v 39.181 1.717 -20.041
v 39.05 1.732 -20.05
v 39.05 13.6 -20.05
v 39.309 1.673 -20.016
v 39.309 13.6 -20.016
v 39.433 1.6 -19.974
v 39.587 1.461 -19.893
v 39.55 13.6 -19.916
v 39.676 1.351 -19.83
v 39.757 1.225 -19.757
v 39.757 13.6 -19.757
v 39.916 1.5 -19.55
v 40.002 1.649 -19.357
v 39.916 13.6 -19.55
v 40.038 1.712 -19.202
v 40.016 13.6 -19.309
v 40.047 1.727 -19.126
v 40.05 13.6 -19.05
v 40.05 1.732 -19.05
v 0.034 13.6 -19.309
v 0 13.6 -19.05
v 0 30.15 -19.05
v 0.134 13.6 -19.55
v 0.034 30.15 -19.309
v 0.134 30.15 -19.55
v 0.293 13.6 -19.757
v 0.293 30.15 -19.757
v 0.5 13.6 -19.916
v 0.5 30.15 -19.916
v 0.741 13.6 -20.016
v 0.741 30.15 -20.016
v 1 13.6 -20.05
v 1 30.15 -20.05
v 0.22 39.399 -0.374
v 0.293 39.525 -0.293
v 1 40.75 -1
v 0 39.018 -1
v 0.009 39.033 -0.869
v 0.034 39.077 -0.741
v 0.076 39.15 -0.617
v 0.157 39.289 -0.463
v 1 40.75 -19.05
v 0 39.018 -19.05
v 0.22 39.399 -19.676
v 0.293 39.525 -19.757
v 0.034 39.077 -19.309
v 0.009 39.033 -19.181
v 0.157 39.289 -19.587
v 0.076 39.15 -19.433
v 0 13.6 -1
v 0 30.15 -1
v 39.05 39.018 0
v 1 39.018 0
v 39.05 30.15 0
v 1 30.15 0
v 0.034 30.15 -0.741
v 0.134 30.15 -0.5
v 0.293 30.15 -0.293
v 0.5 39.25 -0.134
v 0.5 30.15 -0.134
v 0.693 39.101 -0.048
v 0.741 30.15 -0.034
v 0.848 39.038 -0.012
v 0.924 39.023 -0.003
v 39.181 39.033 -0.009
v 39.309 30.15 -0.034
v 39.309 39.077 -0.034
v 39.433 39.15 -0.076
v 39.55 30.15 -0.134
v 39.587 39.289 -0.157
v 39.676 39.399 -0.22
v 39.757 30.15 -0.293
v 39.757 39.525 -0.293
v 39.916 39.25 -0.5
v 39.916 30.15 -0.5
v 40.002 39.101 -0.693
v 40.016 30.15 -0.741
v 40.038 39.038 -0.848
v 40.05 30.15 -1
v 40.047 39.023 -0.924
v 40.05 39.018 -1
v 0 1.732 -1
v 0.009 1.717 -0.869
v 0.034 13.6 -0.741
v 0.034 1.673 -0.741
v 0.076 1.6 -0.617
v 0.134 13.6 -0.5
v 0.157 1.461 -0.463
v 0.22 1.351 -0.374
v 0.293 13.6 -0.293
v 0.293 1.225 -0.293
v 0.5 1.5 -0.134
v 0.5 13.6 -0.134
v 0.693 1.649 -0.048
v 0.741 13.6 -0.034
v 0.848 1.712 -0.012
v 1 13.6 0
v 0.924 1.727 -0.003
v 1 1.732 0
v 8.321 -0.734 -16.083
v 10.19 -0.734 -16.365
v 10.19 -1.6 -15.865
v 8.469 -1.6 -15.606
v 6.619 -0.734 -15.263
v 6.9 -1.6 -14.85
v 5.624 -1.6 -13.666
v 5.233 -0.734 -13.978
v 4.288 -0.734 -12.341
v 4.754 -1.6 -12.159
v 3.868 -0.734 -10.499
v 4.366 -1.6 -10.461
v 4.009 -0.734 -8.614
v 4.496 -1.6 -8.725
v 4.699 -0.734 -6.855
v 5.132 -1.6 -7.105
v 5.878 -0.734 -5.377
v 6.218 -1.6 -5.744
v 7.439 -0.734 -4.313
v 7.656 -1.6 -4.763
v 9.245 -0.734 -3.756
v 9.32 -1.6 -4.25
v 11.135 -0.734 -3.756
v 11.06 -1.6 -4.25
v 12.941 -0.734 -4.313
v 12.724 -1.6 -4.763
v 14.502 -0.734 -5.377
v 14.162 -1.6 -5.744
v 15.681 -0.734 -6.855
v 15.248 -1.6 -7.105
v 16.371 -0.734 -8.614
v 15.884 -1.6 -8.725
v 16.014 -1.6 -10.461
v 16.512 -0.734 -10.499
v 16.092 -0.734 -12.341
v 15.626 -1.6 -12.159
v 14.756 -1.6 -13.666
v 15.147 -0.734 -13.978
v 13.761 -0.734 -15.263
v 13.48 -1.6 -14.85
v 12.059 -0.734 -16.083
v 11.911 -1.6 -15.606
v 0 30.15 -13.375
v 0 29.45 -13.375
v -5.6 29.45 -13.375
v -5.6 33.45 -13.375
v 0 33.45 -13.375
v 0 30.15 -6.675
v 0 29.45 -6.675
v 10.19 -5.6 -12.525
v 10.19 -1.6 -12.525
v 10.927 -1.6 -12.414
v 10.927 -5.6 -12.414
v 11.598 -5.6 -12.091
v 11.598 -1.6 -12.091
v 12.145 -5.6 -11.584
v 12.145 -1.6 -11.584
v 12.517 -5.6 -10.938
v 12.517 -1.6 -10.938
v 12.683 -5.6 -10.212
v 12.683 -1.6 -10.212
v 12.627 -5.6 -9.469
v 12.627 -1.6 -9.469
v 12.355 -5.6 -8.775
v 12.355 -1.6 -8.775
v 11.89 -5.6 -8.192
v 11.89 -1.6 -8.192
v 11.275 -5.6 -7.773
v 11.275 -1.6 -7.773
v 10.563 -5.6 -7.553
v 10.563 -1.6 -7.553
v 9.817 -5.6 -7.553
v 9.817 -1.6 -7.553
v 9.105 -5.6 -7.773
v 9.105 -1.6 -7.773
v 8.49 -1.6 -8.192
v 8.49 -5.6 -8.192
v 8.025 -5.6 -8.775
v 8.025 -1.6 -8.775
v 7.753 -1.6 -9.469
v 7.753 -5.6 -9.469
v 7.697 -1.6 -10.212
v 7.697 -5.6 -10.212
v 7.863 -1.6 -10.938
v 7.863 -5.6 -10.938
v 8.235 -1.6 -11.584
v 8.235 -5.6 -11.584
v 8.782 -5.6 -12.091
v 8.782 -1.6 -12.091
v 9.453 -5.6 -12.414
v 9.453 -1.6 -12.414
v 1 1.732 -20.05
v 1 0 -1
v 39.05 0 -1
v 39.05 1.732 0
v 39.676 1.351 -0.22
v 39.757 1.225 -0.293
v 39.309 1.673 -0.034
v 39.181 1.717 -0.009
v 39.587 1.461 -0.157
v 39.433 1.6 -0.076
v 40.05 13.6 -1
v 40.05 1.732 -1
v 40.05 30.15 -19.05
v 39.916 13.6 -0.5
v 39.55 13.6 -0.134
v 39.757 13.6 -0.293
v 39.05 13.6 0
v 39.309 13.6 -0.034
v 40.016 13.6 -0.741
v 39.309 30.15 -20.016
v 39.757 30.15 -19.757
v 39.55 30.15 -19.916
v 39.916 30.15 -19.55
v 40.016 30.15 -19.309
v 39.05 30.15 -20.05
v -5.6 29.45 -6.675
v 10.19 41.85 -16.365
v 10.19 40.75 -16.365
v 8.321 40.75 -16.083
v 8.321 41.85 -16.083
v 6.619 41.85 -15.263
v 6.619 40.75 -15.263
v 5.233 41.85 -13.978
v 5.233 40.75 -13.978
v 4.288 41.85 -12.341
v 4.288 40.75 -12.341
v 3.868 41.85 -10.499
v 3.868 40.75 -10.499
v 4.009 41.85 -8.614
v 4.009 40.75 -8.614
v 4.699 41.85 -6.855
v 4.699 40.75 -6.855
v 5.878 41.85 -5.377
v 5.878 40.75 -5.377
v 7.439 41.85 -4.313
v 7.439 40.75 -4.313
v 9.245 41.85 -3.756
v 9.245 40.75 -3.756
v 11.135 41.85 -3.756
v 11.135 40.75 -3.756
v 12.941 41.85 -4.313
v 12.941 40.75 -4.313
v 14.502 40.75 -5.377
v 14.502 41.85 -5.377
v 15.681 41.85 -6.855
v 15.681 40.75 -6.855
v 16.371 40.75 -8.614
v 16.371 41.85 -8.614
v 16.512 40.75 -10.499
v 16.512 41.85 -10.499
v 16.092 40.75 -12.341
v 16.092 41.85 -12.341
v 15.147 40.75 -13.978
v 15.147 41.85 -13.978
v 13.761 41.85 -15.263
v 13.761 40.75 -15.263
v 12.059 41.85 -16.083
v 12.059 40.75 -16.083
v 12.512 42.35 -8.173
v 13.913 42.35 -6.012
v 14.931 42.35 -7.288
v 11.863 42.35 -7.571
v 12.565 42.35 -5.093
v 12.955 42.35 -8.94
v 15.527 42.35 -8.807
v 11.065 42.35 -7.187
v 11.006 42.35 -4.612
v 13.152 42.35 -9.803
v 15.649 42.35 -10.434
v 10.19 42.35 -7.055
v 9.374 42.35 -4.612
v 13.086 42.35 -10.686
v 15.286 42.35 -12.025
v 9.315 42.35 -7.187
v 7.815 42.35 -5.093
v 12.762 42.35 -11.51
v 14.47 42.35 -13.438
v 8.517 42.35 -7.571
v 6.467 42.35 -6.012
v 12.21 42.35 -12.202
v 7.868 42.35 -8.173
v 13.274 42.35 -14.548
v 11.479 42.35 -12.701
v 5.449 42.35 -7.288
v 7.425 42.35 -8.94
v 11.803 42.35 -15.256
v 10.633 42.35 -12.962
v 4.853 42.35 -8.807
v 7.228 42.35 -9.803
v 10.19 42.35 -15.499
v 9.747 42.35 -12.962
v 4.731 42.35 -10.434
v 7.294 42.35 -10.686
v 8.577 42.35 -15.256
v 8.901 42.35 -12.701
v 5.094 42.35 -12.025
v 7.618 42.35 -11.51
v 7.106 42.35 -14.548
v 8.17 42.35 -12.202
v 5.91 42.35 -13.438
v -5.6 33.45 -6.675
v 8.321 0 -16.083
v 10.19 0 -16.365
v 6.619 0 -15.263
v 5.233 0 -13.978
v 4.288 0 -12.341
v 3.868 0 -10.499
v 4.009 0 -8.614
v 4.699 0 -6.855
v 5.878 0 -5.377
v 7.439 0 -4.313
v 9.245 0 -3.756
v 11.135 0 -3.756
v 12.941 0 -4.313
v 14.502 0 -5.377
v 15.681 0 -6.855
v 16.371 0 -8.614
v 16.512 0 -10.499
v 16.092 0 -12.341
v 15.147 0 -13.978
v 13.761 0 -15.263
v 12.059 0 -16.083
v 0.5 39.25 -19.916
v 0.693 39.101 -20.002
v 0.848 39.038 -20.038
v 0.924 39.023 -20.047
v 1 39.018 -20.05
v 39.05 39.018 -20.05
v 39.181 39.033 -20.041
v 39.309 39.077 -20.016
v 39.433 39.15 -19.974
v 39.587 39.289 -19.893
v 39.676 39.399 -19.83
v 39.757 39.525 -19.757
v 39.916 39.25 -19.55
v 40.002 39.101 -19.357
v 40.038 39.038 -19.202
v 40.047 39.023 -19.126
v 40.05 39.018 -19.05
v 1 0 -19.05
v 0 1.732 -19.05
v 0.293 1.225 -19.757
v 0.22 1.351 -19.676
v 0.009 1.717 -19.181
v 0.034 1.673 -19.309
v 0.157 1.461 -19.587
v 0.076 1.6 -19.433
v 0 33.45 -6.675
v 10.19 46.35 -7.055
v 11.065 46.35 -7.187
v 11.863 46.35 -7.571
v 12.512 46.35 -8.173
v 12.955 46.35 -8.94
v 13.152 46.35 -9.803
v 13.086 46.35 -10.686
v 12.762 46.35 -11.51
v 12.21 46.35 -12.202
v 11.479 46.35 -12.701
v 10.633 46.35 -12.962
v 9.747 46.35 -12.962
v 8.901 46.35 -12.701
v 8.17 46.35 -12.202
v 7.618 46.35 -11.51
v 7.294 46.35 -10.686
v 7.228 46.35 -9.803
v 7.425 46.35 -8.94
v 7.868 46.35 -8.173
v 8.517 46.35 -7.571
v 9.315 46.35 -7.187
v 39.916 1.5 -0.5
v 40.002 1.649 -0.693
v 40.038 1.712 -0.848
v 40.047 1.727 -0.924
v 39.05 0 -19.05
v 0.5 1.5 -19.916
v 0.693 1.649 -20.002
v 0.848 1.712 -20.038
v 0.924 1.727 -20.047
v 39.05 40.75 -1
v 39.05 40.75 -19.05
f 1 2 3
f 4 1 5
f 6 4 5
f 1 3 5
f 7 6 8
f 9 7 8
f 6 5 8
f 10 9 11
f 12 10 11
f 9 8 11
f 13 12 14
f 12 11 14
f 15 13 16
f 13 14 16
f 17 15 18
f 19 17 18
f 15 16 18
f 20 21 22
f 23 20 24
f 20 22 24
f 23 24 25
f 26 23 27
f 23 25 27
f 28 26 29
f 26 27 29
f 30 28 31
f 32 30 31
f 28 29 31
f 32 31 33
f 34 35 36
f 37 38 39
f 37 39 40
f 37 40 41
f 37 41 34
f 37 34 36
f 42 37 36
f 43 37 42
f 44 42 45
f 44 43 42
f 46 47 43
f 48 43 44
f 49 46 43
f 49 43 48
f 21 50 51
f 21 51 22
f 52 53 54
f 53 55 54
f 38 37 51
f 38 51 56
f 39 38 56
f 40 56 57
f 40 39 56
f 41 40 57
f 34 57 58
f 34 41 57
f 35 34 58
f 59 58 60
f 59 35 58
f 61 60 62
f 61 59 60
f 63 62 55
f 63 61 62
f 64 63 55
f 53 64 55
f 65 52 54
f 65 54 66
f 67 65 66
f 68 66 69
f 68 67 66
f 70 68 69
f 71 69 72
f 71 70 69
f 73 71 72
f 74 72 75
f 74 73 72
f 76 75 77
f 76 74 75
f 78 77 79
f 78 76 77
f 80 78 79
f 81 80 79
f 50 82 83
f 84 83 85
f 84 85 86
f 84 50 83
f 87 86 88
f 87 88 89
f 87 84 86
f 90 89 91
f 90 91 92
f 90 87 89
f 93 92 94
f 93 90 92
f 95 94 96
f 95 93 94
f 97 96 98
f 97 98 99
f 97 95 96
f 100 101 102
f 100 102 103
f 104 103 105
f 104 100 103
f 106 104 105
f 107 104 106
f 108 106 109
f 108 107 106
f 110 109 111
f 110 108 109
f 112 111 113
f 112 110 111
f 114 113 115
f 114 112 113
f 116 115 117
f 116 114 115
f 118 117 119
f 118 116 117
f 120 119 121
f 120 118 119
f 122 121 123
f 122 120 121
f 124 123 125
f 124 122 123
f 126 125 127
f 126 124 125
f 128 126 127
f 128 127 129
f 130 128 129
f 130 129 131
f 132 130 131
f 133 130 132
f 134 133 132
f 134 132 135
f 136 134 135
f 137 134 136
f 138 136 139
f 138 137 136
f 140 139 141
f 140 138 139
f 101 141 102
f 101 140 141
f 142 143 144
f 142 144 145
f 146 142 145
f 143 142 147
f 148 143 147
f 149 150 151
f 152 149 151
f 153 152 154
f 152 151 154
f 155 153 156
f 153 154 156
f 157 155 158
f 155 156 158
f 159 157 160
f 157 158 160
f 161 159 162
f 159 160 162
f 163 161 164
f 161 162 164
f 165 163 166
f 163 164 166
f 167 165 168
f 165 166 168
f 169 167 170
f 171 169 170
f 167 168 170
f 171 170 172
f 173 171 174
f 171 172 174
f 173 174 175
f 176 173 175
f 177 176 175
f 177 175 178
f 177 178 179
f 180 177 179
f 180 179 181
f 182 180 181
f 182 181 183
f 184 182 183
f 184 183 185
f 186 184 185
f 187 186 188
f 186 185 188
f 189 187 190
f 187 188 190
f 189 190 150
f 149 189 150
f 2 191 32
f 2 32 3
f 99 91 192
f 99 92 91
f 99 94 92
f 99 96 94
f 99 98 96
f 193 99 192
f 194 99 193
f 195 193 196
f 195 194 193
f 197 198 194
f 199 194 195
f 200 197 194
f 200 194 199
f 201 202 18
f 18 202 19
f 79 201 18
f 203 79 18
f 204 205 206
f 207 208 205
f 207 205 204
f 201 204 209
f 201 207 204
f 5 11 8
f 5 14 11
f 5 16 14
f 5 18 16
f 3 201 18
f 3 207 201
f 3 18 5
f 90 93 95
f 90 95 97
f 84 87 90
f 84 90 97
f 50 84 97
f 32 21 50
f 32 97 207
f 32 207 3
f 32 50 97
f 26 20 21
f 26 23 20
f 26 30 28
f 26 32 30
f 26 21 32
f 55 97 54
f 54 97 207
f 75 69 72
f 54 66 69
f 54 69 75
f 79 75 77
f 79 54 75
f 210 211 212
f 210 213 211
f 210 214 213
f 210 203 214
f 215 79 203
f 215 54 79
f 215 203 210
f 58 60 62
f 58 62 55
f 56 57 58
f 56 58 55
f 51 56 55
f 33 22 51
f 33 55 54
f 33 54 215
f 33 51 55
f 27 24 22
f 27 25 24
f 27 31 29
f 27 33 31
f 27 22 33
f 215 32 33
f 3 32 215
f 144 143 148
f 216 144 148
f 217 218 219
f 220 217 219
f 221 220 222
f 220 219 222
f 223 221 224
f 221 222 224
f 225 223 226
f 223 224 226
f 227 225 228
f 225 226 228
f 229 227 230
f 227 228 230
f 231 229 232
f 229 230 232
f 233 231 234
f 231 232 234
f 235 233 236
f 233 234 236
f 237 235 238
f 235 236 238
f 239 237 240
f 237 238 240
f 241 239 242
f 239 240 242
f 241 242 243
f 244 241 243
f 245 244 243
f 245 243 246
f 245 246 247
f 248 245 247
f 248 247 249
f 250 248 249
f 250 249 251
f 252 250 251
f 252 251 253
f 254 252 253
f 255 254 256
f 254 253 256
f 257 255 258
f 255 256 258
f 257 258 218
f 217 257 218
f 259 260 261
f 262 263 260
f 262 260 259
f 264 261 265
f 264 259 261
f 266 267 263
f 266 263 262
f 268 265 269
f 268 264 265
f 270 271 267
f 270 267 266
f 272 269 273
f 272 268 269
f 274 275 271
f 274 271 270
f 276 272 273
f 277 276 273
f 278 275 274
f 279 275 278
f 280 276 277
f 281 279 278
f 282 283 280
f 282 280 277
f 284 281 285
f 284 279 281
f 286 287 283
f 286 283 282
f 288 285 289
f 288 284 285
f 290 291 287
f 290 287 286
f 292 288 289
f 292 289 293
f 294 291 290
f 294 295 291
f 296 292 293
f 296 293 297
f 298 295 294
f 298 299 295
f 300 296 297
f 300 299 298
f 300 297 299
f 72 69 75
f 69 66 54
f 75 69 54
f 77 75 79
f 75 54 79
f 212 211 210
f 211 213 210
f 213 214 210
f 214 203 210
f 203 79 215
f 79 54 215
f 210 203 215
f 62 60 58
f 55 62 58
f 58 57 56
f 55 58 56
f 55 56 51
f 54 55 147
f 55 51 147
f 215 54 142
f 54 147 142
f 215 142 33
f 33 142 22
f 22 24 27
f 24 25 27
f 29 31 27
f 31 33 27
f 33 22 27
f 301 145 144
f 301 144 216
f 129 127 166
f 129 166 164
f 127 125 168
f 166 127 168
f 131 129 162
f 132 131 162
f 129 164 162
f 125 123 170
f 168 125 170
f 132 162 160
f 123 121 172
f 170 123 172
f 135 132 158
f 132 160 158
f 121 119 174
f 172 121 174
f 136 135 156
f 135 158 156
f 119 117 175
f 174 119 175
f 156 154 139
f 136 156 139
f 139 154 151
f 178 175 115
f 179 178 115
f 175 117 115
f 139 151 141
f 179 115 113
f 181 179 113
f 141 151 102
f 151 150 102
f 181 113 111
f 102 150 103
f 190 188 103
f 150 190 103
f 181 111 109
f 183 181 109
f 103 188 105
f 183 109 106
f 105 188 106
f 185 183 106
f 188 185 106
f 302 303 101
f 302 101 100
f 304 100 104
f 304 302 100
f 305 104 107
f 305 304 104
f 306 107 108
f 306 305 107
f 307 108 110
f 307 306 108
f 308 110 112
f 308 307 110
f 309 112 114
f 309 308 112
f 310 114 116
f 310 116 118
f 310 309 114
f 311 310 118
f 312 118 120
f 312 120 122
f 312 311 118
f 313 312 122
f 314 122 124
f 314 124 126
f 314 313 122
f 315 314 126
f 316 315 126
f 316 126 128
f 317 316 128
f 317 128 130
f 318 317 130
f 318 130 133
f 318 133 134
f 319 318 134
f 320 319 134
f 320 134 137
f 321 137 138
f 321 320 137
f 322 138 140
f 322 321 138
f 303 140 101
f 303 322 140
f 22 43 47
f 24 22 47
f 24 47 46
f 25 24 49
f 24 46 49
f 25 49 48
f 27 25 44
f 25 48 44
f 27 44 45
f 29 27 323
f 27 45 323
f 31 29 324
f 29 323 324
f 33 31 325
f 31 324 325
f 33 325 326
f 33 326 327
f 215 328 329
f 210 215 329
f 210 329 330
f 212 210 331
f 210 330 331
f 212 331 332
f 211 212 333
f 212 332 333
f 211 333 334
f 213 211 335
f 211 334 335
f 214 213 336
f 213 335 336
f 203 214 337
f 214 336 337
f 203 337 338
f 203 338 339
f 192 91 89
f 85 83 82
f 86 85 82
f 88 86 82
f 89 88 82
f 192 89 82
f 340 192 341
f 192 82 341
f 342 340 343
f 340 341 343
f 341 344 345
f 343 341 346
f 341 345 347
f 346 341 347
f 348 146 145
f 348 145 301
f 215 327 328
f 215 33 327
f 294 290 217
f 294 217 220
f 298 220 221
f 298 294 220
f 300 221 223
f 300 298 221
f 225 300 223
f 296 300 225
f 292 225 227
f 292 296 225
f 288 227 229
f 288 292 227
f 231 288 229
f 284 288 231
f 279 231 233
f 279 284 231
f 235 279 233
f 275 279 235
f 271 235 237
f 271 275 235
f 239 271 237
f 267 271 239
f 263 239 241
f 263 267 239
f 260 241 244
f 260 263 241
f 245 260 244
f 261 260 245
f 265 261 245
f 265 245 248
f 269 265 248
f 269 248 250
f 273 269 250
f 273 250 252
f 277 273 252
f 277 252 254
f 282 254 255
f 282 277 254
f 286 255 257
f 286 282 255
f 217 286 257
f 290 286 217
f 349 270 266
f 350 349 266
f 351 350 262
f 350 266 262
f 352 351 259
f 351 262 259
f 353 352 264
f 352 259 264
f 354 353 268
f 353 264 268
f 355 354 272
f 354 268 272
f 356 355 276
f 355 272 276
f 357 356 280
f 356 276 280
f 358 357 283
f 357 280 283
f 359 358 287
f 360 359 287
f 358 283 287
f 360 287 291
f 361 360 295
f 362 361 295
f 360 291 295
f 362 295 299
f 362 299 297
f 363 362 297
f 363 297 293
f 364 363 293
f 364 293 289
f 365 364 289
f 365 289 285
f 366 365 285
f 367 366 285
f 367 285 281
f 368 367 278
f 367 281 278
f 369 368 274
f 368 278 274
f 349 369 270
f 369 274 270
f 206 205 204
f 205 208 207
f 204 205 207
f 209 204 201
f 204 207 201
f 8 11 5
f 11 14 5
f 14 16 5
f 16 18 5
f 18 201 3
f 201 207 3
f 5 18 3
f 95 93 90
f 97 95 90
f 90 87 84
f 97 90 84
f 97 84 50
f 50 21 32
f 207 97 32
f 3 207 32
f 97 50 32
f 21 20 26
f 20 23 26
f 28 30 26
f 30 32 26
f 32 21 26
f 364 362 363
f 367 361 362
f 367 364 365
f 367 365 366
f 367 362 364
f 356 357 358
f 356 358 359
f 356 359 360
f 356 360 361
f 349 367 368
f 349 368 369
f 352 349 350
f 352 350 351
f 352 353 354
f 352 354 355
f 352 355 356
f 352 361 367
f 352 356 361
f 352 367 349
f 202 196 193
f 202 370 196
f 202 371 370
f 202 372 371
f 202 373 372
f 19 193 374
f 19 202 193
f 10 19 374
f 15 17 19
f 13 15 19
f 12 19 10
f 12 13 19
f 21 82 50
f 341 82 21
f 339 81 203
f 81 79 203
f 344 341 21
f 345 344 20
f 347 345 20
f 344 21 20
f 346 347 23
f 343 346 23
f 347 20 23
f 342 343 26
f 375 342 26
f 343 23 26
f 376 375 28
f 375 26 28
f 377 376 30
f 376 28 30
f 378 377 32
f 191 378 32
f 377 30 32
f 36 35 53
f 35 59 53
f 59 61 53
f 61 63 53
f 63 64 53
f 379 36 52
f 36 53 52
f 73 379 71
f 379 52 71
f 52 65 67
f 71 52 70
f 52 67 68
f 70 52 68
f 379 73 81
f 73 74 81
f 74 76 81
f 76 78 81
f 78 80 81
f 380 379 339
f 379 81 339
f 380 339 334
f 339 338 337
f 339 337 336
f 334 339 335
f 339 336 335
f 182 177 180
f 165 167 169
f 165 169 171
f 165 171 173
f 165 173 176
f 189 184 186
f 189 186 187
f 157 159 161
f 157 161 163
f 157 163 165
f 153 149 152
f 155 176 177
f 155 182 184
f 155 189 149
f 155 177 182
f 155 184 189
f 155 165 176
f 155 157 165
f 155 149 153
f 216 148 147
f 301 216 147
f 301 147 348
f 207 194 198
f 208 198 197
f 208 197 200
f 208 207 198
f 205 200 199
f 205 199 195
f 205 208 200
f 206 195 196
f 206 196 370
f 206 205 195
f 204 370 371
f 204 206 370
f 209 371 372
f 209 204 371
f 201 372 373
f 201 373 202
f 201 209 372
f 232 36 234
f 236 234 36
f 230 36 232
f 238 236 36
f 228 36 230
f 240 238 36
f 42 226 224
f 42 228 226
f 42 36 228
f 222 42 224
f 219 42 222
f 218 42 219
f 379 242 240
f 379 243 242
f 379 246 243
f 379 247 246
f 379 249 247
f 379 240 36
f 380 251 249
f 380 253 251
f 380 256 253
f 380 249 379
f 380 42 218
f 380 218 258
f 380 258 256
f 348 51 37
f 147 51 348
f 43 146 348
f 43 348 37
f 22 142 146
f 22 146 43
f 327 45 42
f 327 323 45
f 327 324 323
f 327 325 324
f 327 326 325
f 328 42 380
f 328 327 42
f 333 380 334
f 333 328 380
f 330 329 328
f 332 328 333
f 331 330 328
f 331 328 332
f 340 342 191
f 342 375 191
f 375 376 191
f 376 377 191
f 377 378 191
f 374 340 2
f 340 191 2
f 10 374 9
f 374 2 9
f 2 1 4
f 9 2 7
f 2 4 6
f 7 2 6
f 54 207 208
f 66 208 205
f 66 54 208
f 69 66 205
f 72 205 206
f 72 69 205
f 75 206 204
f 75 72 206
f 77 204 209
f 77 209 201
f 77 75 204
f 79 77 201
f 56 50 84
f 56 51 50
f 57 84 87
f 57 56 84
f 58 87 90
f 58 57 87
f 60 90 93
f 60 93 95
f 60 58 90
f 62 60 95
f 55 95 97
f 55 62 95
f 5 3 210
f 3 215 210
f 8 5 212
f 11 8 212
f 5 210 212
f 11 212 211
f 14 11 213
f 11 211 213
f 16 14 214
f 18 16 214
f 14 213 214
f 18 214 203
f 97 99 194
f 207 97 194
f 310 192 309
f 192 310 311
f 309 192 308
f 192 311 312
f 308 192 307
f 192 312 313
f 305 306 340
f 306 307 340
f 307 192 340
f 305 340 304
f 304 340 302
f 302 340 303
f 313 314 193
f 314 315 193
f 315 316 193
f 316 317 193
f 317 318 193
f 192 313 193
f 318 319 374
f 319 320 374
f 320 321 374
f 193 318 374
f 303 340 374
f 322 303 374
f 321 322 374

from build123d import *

# Parameters (mm, degrees)
SKETCH1_W                = 40.05
SKETCH1_H                = 20.05
BOSS_EXTRUDE1_DEPTH      = 40.75
SKETCH2_R                = 6.34
BOSS_EXTRUDE2_DEPTH      = 1.6
SKETCH3_R                = 2.97
BOSS_EXTRUDE3_DEPTH      = 4
SKETCH4_R                = 2.5
BOSS_EXTRUDE4_DEPTH      = 4
SPLIT1_SURFACE_1_1_BACK  = 69.592
SPLIT1_SURFACE_1_1_DEPTH = 139.184
SPLIT1_SURFACE_1_2_BACK  = 69.592
SPLIT1_SURFACE_1_2_DEPTH = 139.184
SPLIT1_SURFACE_2_3_BACK  = 69.592
SPLIT1_SURFACE_2_3_DEPTH = 139.184
SPLIT1_SURFACE_2_4_BACK  = 69.592
SPLIT1_SURFACE_2_4_DEPTH = 139.184
CHAMFER1_SIZE            = 1
CHAMFER1_SIZE2           = 1.732050808
CHAMFER2_SIZE            = 1
CHAMFER2_SIZE2           = 1.732050808
FILLET1_R                = 1
FILLET2_R                = 1
FILLET3_R                = 1
CHAMFER3_SIZE            = 0.5
CHAMFER3_SIZE2           = 0.866025404
CHAMFER4_SIZE            = 0.5
CHAMFER4_SIZE2           = 0.866025404
SKETCH6_W                = 6.7
SKETCH6_H                = 4
BOSS_EXTRUDE5_DEPTH      = 5.6


with BuildPart() as part:
    # Sketch1 → Boss-Extrude1 (new body)
    with BuildSketch(Plane(origin=(0, 0, 0), x_dir=(1, 0, 0), z_dir=(0, 1, 0))):
        with Locations((20.025, 10.025)):
            Rectangle(SKETCH1_W, SKETCH1_H)
    extrude(amount=BOSS_EXTRUDE1_DEPTH)

    # Sketch2 → Boss-Extrude2 (add)
    with BuildSketch(Plane(origin=(0, 40.75, 0), x_dir=(1, 0, 0), z_dir=(0, 1, 0))):
        with Locations(Location((10.19, 10.025, 0), (0, 0, 90))):
            Circle(SKETCH2_R)
    boss_extrude2 = extrude(amount=BOSS_EXTRUDE2_DEPTH)

    # Sketch3 → Boss-Extrude3 (add)
    with BuildSketch(Plane(origin=(0, 42.35, 0), x_dir=(1, 0, 0), z_dir=(0, 1, 0))):
        with Locations(Location((10.19, 10.025, 0), (0, 0, 270))):
            Circle(SKETCH3_R)
    extrude(amount=BOSS_EXTRUDE3_DEPTH)

    # Mirror1: Boss-Extrude2 across plane
    add(boss_extrude2.mirror(Plane.ZX.offset(20.375)))

    # Sketch4 → Boss-Extrude4 (add)
    with BuildSketch(Plane.XZ.offset(1.6)):
        with Locations(Location((10.19, -10.025, 0), (0, 0, 270))):
            Circle(SKETCH4_R)
    extrude(amount=BOSS_EXTRUDE4_DEPTH)


with BuildPart() as body_2:
    # Split1: the piece behind the surface
    add(part.part)
    # Split1 surface 1: a surface, the sketch's curves swept straight by 139.184 mm
    with BuildLine(Plane(origin=(40.05, 0, 0), x_dir=(0, 0, -1), z_dir=(1, 0, 0)).offset(-SPLIT1_SURFACE_1_1_BACK), mode=Mode.PRIVATE) as split1_surface_1_1_path:
        Line((0, 30.15), (20.05, 30.15))
    split1_surface_1_1 = Shell.extrude(split1_surface_1_1_path.wire(), (1 * SPLIT1_SURFACE_1_1_DEPTH, 0 * SPLIT1_SURFACE_1_1_DEPTH, 0 * SPLIT1_SURFACE_1_1_DEPTH))
    split(bisect_by=split1_surface_1_1, keep=Keep.BOTTOM)


with BuildPart() as part_1:
    add(part.part)

    # Split1: split by a surface, the side it looks to stays
    # Split1 surface 1: a surface, the sketch's curves swept straight by 139.184 mm
    with BuildLine(Plane(origin=(40.05, 0, 0), x_dir=(0, 0, -1), z_dir=(1, 0, 0)).offset(-SPLIT1_SURFACE_1_2_BACK), mode=Mode.PRIVATE) as split1_surface_1_2_path:
        Line((0, 30.15), (20.05, 30.15))
    split1_surface_1_2 = Shell.extrude(split1_surface_1_2_path.wire(), (1 * SPLIT1_SURFACE_1_2_DEPTH, 0 * SPLIT1_SURFACE_1_2_DEPTH, 0 * SPLIT1_SURFACE_1_2_DEPTH))
    split(bisect_by=split1_surface_1_2, keep=Keep.TOP)

    # Chamfer1
    chamfer1_edges = [part_1.edges().sort_by_distance(p)[0] for p in [
        (0, 40.75, -10.025),
        (20.025, 40.75, 0),
        (40.05, 40.75, -10.025),
        (20.025, 40.75, -20.05),
    ]]
    chamfer1_side = [part_1.faces().sort_by_distance(p)[0] for p in [
        (21.860232038, 40.75, -10.025),
    ]]
    chamfer(chamfer1_edges, length=CHAMFER1_SIZE, length2=CHAMFER1_SIZE2, reference=chamfer1_side[0])

    # Fillet1
    fillet1_edges = [part_1.edges().sort_by_distance(p)[0] for p in [
        (0, 34.583974596, -20.05),
        (40.05, 34.583974596, -20.05),
        (40.05, 34.583974596, 0),
        (0, 34.583974596, 0),
    ]]
    fillet(fillet1_edges, radius=FILLET1_R)

    # Chamfer3
    chamfer3_edges = [part_1.edges().sort_by_distance(p)[0] for p in [
        (10.19, 42.35, -3.685),
    ]]
    chamfer3_side = [part_1.faces().sort_by_distance(p)[0] for p in [
        (10.19, 41.55, -3.685),
    ]]
    chamfer(chamfer3_edges, length=CHAMFER3_SIZE, length2=CHAMFER3_SIZE2, reference=chamfer3_side[0])

    # Sketch6 → Boss-Extrude5 (add)
    with BuildSketch(Plane.ZY):
        with Locations((-10.025, 31.45)):
            Rectangle(SKETCH6_W, SKETCH6_H)
    extrude(amount=BOSS_EXTRUDE5_DEPTH)


with BuildPart() as body_3:
    # Split1 2 body 2: the piece behind the surface
    add(body_2.part)
    # Split1 surface 2: a surface, the sketch's curves swept straight by 139.184 mm
    with BuildLine(Plane(origin=(40.05, 0, 0), x_dir=(0, 0, -1), z_dir=(1, 0, 0)).offset(-SPLIT1_SURFACE_2_3_BACK), mode=Mode.PRIVATE) as split1_surface_2_3_path:
        Line((0, 13.6), (20.05, 13.6))
    split1_surface_2_3 = Shell.extrude(split1_surface_2_3_path.wire(), (1 * SPLIT1_SURFACE_2_3_DEPTH, 0 * SPLIT1_SURFACE_2_3_DEPTH, 0 * SPLIT1_SURFACE_2_3_DEPTH))
    split(bisect_by=split1_surface_2_3, keep=Keep.BOTTOM)

    # Chamfer2
    chamfer2_edges = [body_3.edges().sort_by_distance(p)[0] for p in [
        (20.025, 0, -20.05),
        (40.05, 0, -10.025),
        (20.025, 0, 0),
        (0, 0, -10.025),
    ]]
    chamfer2_side = [body_3.faces().sort_by_distance(p)[0] for p in [
        (21.860232038, 0, -10.025),
    ]]
    chamfer(chamfer2_edges, length=CHAMFER2_SIZE, length2=CHAMFER2_SIZE2, reference=chamfer2_side[0])

    # Fillet3
    fillet3_edges = [body_3.edges().sort_by_distance(p)[0] for p in [
        (0, 7.666025404, -20.05),
        (40.05, 7.666025404, -20.05),
        (40.05, 7.666025404, 0),
        (0, 7.666025404, 0),
    ]]
    fillet(fillet3_edges, radius=FILLET3_R)

    # Chamfer4
    chamfer4_edges = [body_3.edges().sort_by_distance(p)[0] for p in [
        (10.19, -1.6, -3.685),
    ]]
    chamfer4_side = [body_3.faces().sort_by_distance(p)[0] for p in [
        (10.19, -1.6, -3.86432228),
    ]]
    chamfer(chamfer4_edges, length=CHAMFER4_SIZE, length2=CHAMFER4_SIZE2, reference=chamfer4_side[0])


with BuildPart() as body_2_1:
    add(body_2.part)

    # Split1 2 body 2: split by a surface, the side it looks to stays
    # Split1 surface 2: a surface, the sketch's curves swept straight by 139.184 mm
    with BuildLine(Plane(origin=(40.05, 0, 0), x_dir=(0, 0, -1), z_dir=(1, 0, 0)).offset(-SPLIT1_SURFACE_2_4_BACK), mode=Mode.PRIVATE) as split1_surface_2_4_path:
        Line((0, 13.6), (20.05, 13.6))
    split1_surface_2_4 = Shell.extrude(split1_surface_2_4_path.wire(), (1 * SPLIT1_SURFACE_2_4_DEPTH, 0 * SPLIT1_SURFACE_2_4_DEPTH, 0 * SPLIT1_SURFACE_2_4_DEPTH))
    split(bisect_by=split1_surface_2_4, keep=Keep.TOP)

    # Fillet2
    fillet2_edges = [body_2_1.edges().sort_by_distance(p)[0] for p in [
        (0, 21.875, -20.05),
        (40.05, 21.875, -20.05),
        (40.05, 21.875, 0),
        (0, 21.875, 0),
    ]]
    fillet(fillet2_edges, radius=FILLET2_R)


solid = Compound([part_1.part, body_3.part, body_2_1.part])
